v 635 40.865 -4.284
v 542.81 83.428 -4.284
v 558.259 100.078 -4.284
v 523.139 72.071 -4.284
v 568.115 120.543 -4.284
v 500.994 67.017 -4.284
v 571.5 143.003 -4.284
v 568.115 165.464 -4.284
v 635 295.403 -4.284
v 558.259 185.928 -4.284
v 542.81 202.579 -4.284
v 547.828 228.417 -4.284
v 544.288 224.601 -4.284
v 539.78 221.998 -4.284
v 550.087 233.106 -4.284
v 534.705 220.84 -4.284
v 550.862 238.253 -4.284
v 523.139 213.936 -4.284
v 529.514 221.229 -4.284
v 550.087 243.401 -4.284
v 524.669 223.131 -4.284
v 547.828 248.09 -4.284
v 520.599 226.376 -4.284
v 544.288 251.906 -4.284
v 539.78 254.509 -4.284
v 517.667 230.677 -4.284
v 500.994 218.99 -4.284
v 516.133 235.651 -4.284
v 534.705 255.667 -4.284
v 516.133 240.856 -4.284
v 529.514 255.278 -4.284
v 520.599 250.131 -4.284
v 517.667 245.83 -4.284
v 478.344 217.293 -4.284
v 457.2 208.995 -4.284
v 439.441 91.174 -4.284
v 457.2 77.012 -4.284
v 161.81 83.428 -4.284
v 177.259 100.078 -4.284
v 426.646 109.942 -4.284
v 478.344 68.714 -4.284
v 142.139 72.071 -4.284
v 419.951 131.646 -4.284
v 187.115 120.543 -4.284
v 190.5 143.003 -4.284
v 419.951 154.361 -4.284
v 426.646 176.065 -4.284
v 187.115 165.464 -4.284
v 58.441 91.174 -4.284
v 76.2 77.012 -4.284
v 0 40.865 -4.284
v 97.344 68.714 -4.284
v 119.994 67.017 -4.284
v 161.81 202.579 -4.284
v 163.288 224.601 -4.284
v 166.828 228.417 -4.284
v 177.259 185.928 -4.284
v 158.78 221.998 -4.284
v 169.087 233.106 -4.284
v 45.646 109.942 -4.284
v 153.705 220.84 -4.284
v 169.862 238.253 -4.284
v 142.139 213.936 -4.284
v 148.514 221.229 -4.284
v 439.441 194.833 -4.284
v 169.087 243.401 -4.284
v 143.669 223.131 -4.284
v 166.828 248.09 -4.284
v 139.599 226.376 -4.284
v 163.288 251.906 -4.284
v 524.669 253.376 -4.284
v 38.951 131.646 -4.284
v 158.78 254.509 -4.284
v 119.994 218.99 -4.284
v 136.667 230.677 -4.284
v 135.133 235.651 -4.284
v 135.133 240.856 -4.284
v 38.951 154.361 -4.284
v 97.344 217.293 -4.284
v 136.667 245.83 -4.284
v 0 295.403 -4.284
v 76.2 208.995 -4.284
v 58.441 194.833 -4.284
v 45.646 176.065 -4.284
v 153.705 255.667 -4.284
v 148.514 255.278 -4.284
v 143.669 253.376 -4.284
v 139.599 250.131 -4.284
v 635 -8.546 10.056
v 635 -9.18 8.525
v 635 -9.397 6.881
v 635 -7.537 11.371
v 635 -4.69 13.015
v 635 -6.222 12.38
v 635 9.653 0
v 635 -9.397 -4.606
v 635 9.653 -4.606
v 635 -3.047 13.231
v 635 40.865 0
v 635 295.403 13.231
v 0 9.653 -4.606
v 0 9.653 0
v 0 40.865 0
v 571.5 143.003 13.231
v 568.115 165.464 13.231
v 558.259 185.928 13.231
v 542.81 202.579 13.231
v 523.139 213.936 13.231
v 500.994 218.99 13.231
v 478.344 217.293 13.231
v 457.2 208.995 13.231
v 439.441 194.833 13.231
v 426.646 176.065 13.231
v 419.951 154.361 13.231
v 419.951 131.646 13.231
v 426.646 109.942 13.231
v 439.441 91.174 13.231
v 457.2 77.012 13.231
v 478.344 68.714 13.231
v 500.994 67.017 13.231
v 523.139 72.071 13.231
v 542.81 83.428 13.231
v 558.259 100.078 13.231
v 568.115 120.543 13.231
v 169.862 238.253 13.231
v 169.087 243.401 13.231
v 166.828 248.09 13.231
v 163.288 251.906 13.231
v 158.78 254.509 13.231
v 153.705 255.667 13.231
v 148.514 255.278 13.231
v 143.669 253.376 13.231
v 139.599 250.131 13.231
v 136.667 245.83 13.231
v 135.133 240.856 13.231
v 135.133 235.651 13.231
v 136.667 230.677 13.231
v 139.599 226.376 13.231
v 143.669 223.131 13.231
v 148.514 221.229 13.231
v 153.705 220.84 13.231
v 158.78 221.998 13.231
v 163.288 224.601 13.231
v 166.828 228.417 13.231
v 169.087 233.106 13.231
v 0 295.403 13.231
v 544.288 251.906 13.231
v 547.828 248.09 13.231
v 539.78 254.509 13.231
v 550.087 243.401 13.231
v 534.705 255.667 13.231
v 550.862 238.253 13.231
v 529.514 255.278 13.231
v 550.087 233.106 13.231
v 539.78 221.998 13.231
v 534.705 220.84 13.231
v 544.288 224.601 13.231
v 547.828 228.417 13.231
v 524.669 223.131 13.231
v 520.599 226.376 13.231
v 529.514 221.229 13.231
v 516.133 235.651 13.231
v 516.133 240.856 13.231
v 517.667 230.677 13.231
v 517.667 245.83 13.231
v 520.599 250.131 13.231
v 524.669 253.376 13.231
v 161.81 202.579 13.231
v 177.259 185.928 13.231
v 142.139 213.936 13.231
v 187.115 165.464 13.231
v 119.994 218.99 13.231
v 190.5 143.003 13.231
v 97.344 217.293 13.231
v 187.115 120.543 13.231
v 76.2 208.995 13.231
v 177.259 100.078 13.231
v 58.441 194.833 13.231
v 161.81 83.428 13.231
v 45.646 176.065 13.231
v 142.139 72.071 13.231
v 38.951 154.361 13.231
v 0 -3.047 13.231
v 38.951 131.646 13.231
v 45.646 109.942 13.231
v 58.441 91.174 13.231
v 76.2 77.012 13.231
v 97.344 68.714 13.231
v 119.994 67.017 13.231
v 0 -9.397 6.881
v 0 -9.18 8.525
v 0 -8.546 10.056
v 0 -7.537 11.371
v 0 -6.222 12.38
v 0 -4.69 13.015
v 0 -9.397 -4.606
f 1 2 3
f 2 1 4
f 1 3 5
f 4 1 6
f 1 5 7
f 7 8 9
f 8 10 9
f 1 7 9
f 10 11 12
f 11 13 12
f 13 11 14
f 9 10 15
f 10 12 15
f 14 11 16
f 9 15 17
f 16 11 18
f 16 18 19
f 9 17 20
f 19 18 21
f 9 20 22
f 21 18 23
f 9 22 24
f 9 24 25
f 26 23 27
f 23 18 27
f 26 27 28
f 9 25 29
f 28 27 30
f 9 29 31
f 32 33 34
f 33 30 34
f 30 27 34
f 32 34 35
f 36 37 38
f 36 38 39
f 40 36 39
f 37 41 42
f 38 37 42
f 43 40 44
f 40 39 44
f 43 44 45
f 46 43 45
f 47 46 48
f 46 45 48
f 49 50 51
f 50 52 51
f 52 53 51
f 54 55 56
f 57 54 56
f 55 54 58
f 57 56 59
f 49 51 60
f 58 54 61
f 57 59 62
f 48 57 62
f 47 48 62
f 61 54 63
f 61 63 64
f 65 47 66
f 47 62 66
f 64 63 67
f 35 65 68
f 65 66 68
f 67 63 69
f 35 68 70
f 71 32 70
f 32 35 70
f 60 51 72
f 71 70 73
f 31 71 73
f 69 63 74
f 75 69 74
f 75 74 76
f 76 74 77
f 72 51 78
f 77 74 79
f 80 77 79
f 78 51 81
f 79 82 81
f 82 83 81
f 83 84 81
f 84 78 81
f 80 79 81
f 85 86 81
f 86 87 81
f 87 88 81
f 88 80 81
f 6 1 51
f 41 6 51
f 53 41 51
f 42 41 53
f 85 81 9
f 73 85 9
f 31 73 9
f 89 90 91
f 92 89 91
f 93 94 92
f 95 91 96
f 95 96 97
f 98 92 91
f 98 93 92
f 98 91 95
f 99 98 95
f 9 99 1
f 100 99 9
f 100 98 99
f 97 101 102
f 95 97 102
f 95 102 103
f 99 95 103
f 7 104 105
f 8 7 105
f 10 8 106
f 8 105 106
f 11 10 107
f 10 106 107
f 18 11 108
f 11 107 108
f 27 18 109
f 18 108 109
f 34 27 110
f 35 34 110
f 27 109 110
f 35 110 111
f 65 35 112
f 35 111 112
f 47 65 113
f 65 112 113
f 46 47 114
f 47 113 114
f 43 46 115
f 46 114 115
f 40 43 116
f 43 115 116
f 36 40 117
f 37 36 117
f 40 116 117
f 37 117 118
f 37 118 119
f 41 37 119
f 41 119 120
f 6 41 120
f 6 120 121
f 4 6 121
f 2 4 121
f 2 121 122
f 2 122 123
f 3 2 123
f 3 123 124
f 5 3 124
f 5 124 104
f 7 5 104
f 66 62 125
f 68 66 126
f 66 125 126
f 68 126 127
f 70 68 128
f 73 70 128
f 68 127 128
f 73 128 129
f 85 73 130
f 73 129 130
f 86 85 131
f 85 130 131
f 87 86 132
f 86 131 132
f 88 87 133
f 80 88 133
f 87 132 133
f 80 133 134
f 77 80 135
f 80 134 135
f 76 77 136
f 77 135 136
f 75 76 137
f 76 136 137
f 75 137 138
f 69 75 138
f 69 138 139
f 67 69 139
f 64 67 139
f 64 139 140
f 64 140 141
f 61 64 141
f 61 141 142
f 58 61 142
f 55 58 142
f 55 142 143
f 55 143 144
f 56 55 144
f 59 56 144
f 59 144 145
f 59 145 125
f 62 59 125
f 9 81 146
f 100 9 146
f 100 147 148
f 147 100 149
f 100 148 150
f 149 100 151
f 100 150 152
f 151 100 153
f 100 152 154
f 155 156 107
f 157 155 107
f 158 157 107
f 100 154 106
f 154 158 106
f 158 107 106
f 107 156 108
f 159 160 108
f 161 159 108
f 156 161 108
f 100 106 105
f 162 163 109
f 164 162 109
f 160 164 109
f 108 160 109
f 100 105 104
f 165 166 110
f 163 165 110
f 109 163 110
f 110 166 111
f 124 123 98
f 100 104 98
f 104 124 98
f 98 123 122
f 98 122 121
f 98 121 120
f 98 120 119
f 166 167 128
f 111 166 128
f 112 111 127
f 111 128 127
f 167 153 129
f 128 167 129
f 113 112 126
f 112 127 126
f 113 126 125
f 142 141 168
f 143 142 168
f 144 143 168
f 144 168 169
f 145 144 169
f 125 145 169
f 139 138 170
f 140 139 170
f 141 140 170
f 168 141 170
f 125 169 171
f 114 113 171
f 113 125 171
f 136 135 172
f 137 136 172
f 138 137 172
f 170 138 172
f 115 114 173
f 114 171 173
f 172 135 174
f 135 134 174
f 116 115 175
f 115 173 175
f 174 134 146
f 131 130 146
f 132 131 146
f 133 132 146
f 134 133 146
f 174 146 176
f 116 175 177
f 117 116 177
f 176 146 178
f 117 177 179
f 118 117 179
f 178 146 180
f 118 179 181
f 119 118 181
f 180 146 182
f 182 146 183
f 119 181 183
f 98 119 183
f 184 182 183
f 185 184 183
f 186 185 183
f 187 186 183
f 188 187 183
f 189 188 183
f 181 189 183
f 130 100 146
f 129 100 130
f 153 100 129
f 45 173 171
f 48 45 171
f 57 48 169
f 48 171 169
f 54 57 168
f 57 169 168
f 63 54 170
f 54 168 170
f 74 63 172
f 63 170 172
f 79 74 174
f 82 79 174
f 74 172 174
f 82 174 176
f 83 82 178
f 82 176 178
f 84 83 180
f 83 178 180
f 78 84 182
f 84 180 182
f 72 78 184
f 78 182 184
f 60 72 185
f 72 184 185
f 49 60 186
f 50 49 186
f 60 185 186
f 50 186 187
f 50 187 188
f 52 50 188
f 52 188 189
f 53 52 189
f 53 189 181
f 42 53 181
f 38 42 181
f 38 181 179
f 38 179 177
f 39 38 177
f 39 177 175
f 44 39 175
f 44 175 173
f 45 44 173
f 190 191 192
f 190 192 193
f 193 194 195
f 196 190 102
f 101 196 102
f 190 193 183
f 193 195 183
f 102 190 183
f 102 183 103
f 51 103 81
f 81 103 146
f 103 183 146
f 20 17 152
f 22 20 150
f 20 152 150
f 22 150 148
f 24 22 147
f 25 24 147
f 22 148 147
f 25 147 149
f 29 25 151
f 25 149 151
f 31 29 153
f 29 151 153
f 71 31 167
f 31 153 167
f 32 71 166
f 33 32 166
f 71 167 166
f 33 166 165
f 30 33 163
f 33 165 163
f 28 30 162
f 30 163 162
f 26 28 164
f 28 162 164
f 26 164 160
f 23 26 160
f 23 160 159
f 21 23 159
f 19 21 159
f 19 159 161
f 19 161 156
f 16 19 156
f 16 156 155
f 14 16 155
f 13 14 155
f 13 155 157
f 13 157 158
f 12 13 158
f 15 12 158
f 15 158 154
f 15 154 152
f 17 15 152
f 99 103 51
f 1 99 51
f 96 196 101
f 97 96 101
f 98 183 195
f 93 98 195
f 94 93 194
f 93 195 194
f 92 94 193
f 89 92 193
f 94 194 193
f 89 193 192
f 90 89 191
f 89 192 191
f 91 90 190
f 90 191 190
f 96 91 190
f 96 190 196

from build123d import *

# Parameters (mm, degrees)
F1_DEPTH = 635
F2_R     = 76.2
F2_R_2   = 17.4625
F3_DEPTH = 25.4


with BuildPart() as f1:
    # F0 (on Right) → F1 (new body)
    with BuildSketch(Plane.YZ):
        with BuildLine():
            ThreePointArc((-3.046519, 13.231003), (-7.536648, 11.371131), (-9.396519, 6.881003))
            Line((-9.396519, 6.881003), (-9.396519, -4.605605))
            Line((-9.396519, -4.605605), (9.653481, -4.605605))
            Line((9.653481, -4.605605), (9.653481, 0))
            Line((9.653481, 0), (40.864997, 0))
            Line((40.864997, 0), (40.864997, -4.284248))
            Line((40.864997, -4.284248), (295.403481, -4.284248))
            Line((295.403481, -4.284248), (295.403481, 13.231003))
            Line((295.403481, 13.231003), (-3.046519, 13.231003))
        make_face()
    extrude(amount=F1_DEPTH)

    # F2 (on face) → F3 (cut)
    with BuildSketch(Plane.XY.offset(13.231003)):
        with Locations((114.3, 143.003481)):
            Circle(F2_R)
        with Locations((495.3, 143.003481)):
            Circle(F2_R)
        with Locations((533.4, 238.253481)):
            Circle(F2_R_2)
        with Locations((152.4, 238.253481)):
            Circle(F2_R_2)
    extrude(amount=-F3_DEPTH, mode=Mode.SUBTRACT)


solid = f1.part
